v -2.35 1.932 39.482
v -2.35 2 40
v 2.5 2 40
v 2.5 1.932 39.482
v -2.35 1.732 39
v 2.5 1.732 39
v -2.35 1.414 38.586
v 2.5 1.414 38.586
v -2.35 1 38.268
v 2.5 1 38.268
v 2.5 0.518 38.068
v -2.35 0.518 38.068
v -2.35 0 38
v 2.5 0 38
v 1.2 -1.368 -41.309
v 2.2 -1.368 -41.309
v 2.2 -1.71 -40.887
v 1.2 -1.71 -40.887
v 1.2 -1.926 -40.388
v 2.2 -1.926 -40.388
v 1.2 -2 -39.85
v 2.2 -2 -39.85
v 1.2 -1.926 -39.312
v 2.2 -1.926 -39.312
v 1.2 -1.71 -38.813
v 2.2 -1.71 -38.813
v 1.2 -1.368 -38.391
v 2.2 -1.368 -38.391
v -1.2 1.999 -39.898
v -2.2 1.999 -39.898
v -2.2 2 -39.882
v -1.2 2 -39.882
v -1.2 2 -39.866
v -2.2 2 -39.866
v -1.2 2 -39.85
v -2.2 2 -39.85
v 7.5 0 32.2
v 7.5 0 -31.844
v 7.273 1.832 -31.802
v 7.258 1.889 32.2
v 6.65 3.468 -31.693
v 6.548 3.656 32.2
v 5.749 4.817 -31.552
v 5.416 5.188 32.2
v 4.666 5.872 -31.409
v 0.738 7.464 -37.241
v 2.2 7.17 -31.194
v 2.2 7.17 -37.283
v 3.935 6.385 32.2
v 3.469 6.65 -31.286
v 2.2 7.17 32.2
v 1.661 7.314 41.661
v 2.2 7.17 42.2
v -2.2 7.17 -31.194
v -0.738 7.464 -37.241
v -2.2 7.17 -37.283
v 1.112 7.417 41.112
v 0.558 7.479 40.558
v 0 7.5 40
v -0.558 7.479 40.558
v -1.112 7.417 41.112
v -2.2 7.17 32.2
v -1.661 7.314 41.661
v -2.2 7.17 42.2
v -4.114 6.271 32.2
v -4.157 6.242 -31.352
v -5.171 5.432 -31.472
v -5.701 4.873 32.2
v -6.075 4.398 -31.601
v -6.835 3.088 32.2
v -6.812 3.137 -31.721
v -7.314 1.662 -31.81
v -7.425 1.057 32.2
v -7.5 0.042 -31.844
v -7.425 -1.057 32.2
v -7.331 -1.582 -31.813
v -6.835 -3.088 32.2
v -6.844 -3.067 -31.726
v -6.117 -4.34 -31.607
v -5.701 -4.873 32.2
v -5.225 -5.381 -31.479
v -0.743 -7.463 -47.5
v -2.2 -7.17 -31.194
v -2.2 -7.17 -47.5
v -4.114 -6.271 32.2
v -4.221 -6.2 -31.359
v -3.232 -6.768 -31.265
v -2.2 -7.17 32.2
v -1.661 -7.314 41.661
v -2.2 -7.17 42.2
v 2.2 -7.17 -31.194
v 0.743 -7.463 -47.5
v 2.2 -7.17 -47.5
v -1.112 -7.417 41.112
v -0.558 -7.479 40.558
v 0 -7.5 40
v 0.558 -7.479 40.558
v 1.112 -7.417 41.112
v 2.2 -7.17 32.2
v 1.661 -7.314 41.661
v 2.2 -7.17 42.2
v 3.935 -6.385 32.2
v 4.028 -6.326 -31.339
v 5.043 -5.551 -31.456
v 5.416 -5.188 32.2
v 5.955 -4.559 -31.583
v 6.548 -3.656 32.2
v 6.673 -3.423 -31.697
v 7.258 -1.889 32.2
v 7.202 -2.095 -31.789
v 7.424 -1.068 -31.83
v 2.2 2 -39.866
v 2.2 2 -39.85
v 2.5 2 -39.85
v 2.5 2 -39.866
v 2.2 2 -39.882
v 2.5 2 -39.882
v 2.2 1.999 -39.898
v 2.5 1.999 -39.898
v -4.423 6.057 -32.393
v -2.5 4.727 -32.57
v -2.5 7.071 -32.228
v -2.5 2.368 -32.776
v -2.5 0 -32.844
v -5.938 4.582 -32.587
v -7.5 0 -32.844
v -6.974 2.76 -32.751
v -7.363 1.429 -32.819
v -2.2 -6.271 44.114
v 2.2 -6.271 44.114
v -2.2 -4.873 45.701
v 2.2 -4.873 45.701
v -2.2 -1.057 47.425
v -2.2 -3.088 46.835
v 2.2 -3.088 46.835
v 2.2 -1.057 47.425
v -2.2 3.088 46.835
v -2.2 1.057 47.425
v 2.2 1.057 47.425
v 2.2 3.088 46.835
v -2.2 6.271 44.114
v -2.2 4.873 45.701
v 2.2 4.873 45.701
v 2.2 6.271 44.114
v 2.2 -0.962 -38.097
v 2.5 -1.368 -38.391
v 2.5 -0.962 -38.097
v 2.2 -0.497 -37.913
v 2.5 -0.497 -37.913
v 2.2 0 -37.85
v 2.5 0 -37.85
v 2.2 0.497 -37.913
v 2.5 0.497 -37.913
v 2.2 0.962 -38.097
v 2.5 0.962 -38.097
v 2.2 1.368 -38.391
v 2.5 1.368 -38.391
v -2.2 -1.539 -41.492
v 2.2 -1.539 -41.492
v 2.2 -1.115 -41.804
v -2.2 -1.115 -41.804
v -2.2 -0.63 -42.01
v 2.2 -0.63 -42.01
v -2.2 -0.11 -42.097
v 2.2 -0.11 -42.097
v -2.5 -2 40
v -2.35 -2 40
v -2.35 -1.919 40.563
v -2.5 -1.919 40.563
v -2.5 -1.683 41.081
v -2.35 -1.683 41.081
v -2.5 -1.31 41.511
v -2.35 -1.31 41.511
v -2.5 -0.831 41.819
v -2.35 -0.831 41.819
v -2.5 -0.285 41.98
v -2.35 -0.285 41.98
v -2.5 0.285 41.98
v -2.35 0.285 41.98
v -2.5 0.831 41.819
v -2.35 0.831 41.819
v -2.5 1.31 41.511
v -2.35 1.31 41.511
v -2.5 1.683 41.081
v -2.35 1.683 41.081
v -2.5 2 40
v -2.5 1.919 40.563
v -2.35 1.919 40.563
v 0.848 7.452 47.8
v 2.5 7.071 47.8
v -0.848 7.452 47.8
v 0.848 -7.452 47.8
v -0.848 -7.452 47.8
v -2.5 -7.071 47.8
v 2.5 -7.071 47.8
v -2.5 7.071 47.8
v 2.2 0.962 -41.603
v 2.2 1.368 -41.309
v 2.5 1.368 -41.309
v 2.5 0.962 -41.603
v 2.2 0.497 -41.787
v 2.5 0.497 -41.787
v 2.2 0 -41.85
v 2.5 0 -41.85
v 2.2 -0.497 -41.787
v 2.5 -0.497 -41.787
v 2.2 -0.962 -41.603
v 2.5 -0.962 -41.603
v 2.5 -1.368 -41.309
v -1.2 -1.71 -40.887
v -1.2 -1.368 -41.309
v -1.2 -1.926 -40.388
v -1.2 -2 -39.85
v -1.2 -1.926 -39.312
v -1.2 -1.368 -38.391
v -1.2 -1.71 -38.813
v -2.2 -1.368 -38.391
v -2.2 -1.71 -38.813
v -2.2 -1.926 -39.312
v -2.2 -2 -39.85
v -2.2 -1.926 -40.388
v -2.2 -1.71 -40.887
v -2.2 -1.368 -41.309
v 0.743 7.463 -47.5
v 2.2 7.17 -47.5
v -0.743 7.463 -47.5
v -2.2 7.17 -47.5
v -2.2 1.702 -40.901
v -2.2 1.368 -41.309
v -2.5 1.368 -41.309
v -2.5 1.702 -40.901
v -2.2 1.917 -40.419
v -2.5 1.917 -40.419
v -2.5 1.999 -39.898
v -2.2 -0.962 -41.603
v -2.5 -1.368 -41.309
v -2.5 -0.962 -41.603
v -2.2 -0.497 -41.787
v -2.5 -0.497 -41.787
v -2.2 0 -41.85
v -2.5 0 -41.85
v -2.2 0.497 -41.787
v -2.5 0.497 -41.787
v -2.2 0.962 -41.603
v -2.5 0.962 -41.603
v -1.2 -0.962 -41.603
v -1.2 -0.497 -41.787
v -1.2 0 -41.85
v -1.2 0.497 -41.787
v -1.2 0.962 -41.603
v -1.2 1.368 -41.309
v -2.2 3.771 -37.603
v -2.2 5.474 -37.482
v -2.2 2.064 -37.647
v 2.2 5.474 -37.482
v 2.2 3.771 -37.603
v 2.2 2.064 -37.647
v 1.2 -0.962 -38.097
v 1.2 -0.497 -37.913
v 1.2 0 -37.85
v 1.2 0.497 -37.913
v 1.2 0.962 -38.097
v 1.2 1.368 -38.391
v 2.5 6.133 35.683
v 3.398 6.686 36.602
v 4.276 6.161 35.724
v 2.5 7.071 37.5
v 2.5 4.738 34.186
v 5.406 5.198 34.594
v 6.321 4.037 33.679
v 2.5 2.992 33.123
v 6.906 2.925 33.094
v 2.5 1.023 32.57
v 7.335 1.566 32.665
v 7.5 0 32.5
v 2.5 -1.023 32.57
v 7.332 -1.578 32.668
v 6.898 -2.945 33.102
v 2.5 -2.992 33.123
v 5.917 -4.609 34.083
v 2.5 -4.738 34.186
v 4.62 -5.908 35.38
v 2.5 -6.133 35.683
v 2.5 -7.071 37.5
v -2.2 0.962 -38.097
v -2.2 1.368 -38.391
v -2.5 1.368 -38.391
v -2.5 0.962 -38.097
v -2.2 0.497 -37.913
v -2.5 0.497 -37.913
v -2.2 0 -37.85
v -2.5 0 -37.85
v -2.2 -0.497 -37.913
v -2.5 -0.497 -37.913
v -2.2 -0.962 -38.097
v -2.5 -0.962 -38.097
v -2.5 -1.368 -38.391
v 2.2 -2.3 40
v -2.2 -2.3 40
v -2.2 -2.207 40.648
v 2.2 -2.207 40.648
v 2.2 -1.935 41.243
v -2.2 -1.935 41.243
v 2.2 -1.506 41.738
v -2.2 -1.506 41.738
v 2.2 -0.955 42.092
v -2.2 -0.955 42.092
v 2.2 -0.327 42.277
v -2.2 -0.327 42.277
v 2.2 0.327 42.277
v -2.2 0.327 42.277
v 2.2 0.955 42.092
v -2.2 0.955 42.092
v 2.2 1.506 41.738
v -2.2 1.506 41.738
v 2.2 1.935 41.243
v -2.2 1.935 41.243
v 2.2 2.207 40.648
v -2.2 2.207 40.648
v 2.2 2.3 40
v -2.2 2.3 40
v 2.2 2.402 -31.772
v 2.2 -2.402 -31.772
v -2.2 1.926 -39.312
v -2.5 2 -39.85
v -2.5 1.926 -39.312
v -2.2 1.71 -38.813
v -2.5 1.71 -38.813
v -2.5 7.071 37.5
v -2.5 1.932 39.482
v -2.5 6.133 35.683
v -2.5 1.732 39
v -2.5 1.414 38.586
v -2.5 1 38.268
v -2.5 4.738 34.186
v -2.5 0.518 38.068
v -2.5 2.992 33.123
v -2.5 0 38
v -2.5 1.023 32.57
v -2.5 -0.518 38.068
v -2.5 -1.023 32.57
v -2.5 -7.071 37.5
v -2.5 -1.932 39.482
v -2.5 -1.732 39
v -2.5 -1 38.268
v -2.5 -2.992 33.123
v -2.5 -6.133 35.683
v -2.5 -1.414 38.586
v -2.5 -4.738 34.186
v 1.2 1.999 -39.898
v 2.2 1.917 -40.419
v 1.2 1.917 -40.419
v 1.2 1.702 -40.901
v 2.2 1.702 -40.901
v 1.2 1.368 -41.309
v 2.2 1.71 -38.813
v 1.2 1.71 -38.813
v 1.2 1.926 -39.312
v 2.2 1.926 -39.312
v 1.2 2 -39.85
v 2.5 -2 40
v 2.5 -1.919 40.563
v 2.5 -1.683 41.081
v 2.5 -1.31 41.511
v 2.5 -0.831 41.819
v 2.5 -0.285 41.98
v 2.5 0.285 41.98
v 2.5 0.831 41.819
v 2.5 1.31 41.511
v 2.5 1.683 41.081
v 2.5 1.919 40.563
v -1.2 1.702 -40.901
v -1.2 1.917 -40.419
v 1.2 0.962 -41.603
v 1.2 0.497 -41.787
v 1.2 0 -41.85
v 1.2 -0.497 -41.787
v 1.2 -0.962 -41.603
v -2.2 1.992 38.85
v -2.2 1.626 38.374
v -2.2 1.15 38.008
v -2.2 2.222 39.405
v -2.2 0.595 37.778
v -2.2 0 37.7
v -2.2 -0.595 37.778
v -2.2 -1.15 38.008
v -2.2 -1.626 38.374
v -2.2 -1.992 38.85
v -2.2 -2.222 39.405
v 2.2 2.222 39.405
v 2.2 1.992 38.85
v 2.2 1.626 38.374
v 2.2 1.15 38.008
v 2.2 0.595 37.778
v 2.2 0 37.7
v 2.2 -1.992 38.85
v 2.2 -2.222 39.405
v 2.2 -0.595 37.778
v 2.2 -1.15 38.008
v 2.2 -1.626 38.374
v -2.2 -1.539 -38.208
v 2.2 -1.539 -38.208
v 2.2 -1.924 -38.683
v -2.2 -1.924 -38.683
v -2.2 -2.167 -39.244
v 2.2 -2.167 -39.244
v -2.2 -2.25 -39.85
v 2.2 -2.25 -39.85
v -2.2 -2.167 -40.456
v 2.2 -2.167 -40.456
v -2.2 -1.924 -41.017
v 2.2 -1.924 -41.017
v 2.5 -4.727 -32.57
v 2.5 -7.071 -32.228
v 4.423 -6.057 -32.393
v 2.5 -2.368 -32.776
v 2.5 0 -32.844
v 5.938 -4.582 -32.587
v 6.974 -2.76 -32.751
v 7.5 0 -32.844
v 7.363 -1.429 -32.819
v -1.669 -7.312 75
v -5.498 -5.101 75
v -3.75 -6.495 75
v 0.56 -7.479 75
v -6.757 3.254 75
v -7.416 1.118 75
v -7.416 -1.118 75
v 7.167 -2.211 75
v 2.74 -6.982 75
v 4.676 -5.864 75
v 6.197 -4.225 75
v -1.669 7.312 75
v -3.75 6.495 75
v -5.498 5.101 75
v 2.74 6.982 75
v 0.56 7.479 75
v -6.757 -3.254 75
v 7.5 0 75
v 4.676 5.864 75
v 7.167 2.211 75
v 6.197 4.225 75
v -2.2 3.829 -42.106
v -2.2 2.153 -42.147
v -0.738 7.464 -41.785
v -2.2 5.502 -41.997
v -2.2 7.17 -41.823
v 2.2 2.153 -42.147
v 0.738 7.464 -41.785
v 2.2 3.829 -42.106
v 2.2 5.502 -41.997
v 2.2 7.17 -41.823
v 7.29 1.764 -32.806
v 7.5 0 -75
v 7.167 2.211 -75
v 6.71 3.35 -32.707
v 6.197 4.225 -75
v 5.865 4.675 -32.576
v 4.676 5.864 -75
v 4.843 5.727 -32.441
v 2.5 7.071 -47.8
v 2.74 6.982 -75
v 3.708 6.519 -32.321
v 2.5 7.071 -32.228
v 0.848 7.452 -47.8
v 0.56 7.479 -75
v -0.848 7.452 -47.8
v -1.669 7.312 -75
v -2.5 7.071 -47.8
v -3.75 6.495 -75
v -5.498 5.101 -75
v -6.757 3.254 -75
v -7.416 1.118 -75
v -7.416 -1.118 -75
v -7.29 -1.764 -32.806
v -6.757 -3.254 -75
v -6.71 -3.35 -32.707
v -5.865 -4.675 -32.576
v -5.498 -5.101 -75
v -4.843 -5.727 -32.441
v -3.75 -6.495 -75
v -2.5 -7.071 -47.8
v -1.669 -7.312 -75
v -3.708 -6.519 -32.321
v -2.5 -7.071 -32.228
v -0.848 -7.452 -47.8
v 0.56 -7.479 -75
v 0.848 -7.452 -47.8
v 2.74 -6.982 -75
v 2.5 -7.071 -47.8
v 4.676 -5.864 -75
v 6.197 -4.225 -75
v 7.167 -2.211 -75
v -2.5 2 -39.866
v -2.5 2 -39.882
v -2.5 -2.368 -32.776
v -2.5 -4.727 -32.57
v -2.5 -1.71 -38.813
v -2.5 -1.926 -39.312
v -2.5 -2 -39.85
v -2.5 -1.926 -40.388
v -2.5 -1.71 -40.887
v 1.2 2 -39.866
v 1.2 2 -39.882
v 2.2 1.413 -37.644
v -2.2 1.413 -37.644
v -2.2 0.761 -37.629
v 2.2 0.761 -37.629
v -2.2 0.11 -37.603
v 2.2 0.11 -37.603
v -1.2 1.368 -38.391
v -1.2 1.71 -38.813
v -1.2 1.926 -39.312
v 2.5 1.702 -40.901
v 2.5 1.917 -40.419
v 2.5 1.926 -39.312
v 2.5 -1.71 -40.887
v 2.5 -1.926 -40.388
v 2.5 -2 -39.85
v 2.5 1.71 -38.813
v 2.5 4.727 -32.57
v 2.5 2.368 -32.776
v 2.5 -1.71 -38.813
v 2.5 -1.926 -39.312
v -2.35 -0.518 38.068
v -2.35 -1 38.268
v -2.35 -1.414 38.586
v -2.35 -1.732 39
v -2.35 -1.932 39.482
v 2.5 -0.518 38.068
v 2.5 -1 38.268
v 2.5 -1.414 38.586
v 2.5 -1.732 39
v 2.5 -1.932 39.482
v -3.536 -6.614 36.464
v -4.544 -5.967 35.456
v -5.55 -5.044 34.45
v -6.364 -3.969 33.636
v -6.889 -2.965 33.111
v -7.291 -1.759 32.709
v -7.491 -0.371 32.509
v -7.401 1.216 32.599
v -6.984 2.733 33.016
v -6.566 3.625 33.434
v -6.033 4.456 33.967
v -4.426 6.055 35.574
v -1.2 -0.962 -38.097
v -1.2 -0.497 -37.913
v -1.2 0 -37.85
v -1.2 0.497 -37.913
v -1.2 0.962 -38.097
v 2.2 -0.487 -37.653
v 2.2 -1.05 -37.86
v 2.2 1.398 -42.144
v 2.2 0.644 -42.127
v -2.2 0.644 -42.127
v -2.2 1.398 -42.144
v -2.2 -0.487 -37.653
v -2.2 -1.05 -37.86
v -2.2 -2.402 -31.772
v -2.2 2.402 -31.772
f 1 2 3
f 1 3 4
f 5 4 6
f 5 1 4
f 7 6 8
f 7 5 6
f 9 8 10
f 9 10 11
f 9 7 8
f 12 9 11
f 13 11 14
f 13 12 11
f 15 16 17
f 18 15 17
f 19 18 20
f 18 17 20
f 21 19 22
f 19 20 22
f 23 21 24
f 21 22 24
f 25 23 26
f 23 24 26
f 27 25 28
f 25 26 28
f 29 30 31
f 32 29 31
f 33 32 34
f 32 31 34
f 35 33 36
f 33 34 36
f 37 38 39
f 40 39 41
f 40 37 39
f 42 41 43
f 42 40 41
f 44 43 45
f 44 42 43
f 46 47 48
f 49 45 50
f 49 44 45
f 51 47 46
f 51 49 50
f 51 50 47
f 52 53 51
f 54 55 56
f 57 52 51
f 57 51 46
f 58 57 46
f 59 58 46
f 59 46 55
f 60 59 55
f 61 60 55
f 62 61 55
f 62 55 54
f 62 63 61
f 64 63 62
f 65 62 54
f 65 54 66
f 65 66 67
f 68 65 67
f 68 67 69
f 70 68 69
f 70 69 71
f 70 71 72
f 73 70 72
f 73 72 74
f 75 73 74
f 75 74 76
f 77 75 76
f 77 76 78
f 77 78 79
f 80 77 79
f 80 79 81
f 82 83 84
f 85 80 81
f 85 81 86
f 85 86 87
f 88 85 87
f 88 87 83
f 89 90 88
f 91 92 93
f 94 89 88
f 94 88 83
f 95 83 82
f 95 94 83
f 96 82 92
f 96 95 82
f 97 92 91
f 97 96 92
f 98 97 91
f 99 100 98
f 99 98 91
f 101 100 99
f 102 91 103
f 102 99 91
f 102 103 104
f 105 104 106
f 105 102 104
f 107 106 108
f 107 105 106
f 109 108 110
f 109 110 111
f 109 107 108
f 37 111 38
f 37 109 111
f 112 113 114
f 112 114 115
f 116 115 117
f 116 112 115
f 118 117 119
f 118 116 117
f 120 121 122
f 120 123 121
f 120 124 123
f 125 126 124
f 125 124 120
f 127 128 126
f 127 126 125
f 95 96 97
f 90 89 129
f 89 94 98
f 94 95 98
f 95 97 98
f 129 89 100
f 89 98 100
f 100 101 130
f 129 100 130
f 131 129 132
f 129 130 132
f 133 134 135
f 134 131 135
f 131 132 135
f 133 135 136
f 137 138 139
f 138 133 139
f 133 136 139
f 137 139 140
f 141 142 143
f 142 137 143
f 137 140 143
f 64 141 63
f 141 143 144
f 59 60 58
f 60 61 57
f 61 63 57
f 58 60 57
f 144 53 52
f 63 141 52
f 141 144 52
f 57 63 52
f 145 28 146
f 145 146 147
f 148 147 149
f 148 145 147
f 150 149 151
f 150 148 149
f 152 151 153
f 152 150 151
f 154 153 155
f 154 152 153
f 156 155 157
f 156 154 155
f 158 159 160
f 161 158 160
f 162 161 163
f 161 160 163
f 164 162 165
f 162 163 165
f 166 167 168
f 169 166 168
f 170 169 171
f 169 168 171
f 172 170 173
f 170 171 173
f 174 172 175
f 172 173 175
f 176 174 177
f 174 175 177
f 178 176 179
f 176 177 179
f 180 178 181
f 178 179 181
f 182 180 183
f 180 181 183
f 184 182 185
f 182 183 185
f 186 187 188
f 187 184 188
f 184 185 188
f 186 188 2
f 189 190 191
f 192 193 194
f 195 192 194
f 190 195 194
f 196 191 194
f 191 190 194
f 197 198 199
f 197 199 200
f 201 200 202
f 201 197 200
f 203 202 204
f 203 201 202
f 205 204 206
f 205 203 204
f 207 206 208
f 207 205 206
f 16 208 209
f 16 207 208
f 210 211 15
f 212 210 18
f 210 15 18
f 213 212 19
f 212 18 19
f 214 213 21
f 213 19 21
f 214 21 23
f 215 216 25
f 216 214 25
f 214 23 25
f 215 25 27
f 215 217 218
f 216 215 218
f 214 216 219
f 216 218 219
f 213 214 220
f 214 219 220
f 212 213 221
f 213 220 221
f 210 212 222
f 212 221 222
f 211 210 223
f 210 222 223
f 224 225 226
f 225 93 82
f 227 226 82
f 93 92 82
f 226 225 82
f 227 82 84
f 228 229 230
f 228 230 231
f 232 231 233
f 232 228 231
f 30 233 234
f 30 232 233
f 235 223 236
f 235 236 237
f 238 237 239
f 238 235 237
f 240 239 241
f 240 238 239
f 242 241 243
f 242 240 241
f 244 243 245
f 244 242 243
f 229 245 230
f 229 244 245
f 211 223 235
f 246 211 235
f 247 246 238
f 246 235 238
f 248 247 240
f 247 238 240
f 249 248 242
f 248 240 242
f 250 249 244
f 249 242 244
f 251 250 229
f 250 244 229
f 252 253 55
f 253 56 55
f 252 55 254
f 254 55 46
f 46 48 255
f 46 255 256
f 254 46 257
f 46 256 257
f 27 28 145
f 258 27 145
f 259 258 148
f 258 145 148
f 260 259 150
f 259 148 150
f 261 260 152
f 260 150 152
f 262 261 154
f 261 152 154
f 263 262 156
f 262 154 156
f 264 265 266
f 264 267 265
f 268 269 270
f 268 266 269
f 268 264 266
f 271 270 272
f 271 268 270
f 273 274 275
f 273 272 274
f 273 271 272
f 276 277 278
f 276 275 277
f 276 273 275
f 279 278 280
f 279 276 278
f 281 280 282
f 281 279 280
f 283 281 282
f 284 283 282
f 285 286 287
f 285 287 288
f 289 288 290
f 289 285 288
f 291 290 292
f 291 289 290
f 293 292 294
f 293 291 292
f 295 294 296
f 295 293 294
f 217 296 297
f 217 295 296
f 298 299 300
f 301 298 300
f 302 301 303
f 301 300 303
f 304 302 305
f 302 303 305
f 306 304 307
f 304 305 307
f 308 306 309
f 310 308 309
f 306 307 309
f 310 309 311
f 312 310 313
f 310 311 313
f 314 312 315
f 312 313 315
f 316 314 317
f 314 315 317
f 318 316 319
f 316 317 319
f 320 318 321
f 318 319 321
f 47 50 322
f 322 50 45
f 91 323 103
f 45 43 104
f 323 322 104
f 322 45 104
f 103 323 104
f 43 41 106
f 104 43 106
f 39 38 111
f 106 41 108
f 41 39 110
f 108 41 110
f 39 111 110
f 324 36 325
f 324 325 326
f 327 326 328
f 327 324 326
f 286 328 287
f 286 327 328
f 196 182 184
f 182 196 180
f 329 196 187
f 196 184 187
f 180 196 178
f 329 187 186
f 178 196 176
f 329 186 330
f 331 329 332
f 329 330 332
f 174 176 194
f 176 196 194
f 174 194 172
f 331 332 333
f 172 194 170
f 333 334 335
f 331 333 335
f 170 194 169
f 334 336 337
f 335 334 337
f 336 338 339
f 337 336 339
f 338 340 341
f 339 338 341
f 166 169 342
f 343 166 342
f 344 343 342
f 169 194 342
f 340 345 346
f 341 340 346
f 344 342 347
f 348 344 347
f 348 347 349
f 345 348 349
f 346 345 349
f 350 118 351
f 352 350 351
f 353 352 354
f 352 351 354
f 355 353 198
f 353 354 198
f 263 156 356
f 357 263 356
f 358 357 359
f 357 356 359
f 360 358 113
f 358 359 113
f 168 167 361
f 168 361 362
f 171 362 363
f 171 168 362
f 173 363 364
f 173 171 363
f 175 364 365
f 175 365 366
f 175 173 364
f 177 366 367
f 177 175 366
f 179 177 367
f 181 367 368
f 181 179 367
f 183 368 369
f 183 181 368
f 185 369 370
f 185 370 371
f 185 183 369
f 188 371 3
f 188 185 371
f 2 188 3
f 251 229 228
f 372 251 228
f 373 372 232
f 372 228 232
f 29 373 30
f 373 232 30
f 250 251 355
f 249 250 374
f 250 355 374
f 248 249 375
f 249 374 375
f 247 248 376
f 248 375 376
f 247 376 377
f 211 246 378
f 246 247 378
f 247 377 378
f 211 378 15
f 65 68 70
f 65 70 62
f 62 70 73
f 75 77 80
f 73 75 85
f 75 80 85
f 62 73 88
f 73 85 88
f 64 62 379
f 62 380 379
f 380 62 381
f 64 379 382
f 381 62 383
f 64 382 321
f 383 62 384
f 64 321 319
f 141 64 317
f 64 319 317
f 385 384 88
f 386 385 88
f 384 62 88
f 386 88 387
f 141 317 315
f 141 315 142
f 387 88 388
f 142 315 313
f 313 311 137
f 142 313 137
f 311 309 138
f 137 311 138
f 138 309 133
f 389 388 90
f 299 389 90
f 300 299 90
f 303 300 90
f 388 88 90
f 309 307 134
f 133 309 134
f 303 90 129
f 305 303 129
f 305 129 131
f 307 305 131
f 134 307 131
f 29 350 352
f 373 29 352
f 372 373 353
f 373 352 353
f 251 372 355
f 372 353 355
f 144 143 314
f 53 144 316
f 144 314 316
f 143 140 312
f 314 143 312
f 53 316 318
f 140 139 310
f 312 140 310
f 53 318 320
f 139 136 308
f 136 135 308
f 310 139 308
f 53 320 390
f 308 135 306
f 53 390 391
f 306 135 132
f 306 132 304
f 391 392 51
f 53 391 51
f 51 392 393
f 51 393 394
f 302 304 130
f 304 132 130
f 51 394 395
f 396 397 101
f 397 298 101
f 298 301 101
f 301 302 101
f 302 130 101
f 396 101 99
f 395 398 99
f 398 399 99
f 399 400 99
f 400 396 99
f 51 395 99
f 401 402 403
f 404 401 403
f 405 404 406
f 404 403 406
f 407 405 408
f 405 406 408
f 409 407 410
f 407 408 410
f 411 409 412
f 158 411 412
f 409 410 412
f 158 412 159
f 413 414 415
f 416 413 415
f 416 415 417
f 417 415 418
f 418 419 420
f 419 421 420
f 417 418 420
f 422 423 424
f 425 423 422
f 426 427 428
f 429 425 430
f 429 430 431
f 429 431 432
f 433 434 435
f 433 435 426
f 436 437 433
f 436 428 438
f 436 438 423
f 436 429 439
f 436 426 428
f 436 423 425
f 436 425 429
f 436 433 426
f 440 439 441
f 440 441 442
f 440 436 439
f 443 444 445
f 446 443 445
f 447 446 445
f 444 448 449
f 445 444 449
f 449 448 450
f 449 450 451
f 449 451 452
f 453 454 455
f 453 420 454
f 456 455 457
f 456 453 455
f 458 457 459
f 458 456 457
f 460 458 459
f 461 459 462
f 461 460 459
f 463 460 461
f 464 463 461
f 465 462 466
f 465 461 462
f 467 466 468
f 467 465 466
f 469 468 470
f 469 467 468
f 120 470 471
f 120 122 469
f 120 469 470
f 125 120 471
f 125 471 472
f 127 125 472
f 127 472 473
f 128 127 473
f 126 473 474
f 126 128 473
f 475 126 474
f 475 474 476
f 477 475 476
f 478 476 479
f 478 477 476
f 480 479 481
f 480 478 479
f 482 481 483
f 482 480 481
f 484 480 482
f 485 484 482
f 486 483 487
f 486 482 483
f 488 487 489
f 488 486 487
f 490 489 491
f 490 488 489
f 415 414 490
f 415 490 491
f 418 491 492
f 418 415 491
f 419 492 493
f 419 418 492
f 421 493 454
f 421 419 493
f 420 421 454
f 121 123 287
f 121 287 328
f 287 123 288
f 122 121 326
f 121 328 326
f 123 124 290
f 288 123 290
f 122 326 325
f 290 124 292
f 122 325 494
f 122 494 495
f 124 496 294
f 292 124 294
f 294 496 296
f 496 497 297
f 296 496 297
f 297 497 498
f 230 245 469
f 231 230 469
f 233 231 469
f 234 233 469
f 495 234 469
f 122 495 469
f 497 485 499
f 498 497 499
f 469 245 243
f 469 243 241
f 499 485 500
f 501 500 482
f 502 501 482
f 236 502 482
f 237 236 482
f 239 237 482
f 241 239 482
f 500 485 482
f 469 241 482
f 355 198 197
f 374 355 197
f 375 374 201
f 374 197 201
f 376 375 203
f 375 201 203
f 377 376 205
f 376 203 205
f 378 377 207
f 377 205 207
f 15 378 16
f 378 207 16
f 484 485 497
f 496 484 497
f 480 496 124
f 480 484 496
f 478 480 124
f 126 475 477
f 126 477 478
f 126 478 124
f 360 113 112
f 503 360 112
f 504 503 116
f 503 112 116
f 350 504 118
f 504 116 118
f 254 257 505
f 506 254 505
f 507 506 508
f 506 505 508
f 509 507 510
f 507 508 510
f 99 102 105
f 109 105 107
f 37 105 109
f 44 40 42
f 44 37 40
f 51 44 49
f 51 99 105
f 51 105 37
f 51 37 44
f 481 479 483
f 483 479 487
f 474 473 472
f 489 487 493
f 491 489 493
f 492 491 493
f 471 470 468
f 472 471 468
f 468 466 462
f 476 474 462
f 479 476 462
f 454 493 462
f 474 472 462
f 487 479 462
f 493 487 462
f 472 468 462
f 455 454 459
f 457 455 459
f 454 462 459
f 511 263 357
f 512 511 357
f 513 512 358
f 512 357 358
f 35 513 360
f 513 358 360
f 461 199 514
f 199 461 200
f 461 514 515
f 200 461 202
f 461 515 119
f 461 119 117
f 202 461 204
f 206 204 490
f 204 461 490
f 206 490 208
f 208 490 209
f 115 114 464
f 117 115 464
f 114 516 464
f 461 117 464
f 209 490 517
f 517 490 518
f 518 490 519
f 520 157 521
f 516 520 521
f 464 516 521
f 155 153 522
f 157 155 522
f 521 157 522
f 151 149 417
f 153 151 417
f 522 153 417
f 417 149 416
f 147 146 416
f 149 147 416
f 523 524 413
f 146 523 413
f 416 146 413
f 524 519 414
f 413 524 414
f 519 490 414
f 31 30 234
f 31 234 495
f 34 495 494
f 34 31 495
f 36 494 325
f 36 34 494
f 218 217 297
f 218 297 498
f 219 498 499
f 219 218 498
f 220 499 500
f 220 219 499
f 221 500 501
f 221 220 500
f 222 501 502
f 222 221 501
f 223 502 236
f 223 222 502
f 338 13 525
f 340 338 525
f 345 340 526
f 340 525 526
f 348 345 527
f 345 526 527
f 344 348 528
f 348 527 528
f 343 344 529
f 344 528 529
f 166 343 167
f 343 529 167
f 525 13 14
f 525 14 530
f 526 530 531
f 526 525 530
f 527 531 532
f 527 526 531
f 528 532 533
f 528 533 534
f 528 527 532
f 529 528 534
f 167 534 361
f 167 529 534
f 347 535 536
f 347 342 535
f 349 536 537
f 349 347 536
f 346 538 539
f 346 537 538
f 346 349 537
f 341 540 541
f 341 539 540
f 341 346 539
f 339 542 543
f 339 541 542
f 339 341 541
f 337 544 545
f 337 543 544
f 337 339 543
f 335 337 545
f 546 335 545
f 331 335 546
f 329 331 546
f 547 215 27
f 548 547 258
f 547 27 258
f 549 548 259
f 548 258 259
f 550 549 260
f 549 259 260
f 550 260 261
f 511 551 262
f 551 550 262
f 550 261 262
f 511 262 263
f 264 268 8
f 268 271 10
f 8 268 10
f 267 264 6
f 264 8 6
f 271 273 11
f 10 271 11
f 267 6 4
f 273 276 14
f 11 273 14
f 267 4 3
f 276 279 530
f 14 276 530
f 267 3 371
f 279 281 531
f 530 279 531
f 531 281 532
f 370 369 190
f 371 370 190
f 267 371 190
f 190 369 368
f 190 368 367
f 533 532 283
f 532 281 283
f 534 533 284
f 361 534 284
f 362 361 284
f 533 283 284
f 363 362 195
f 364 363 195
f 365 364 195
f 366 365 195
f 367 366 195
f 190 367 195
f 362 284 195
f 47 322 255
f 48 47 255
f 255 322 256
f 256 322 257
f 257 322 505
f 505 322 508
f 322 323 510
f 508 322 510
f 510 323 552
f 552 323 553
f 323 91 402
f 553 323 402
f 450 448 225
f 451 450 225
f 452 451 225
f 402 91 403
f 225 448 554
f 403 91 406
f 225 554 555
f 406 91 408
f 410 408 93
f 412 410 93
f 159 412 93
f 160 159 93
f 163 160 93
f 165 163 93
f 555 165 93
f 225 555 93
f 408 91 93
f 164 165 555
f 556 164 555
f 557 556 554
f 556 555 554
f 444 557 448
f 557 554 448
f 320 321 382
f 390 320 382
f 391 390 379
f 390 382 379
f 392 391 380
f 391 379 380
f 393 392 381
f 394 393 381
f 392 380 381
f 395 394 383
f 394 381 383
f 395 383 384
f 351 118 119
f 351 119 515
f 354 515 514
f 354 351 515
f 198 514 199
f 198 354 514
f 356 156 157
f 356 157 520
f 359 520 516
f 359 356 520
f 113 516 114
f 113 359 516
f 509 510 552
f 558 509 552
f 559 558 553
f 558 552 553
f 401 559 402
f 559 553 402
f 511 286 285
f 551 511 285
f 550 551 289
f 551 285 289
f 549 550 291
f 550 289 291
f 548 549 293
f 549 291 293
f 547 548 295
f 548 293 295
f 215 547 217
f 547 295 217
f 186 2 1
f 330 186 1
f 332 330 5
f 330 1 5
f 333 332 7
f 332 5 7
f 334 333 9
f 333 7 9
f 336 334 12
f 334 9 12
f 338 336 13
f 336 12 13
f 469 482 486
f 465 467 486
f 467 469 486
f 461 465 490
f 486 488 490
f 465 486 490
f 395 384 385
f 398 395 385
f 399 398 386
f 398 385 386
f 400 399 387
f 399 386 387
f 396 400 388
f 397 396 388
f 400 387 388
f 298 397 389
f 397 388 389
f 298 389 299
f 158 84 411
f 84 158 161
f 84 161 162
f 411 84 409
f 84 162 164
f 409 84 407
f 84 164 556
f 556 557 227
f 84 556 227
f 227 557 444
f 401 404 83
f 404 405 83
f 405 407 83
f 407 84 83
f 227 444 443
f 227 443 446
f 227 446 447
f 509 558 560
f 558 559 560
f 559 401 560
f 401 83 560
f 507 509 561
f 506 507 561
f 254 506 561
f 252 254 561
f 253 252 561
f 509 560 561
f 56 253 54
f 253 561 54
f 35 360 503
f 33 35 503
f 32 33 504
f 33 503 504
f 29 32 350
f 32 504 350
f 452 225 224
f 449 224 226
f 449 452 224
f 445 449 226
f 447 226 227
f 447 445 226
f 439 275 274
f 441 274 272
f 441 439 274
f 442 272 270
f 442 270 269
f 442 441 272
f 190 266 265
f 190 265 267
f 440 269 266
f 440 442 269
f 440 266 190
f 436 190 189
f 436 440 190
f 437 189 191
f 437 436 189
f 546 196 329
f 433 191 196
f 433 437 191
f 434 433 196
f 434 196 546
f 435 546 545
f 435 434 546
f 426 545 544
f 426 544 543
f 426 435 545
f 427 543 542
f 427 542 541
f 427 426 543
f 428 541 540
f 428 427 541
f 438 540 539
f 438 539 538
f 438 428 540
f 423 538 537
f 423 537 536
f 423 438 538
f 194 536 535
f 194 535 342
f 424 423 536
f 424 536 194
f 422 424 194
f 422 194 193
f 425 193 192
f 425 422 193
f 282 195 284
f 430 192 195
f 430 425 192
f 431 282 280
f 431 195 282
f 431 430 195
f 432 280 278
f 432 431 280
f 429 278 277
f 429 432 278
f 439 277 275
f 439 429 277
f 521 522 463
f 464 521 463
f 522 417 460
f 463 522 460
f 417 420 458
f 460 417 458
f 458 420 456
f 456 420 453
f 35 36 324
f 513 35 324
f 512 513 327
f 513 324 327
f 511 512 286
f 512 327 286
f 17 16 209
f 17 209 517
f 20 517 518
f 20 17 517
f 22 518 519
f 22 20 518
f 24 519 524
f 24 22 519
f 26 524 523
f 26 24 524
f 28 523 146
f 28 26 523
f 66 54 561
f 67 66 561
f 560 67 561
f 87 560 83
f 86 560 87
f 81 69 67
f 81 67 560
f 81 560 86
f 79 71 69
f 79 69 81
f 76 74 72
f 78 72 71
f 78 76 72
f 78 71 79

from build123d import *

# Parameters (mm, degrees)
F0_R           = 7.5
F1_DEPTH       = 75
F3_DEPTH       = 12.5
F8_DEPTH       = 4.8
F9_DEPTH       = 25
F10_DEPTH      = 4.6
F11_DEPTH      = 25
F12_DEPTH      = 4.7
F13_DEPTH      = 3
F13_DEPTH_BACK = 6
F14_DEPTH      = 12.5
F16_DEPTH      = 4.6
F20_DEPTH      = 7.8
F23_DEPTH      = 13.8
F24_DEPTH      = 1


with BuildPart() as f1:
    # F0 (on Top) → F1 (new body, symmetric)
    with BuildSketch(Plane.XY):
        Circle(F0_R)
    extrude(amount=F1_DEPTH, both=True)

    # F2 (on Front) → F3 (cut, symmetric)
    with BuildSketch(Plane.XZ):
        Polygon((2.2, 32.5), (2.2, 32.2), (2.5, 32.2), (2.5, 40), (2.5, 47.8), (0, 47.8), (-2.5, 47.8), (-2.5, 42.1871210635), (-2.5, 32.2), (-2.2, 32.2), (-2.2, 32.5), (-2.2, 40), (-2.2, 47.5), (0, 47.5), (2.2, 47.5), (2.2, 40), align=None)
    extrude(amount=F3_DEPTH, both=True, mode=Mode.SUBTRACT)

    # F7 (on offset) → F8 (cut)
    with BuildSketch(Plane(origin=(-2.35, 0, 0), x_dir=(0, -1, 0), z_dir=(-1, 0, 0))):
        with BuildLine():
            Line((-2, 40), (0, 40))
            Line((0, 40), (2, 40))
            ThreePointArc((2, 40), (0, 42), (-2, 40))
        make_face()
        with BuildLine():
            Line((0, 40), (0, 38))
            ThreePointArc((0, 38), (1.4142135624, 38.5857864376), (2, 40))
            Line((2, 40), (0, 40))
        make_face()
        with BuildLine():
            Line((0, 38), (0, 37.7))
            ThreePointArc((0, 37.7), (1.6263455967, 38.3736544033), (2.3, 40))
            Line((2.3, 40), (2, 40))
            ThreePointArc((2, 40), (1.4142135624, 38.5857864376), (0, 38))
        make_face()
        with BuildLine():
            ThreePointArc((-2, 40), (-1.4142135624, 38.5857864376), (0, 38))
            Line((0, 38), (0, 40))
            Line((0, 40), (-2, 40))
        make_face()
        with BuildLine():
            ThreePointArc((-2.3, 40), (-1.6263455967, 38.3736544033), (0, 37.7))
            Line((0, 37.7), (0, 38))
            ThreePointArc((0, 38), (-1.4142135624, 38.5857864376), (-2, 40))
            Line((-2, 40), (-2.3, 40))
        make_face()
        with BuildLine():
            ThreePointArc((2.3, 40), (0, 42.3), (-2.3, 40))
            Line((-2.3, 40), (-2, 40))
            ThreePointArc((-2, 40), (0, 42), (2, 40))
            Line((2, 40), (2.3, 40))
        make_face()
    extrude(amount=-F8_DEPTH, mode=Mode.SUBTRACT)

    # F5 (on offset) → F9 (cut)
    with BuildSketch(Plane.YZ.offset(2.35)):
        with BuildLine():
            Line((-7.8, 32.2), (0, 32.2))
            ThreePointArc((0, 32.2), (-5.5154328933, 34.4845671067), (-7.8, 40))
            Line((-7.8, 40), (-7.8, 32.2))
        make_face()
        with BuildLine():
            ThreePointArc((-7.8, 40), (-5.5154328933, 34.4845671067), (0, 32.2))
            Line((0, 32.2), (0, 32.5))
            ThreePointArc((0, 32.5), (-5.3033008589, 34.6966991411), (-7.5, 40))
            Line((-7.5, 40), (-7.8, 40))
        make_face()
        with BuildLine():
            Line((0, 32.5), (0, 32.2))
            ThreePointArc((0, 32.2), (5.5154328933, 34.4845671067), (7.8, 40))
            Line((7.8, 40), (7.5, 40))
            ThreePointArc((7.5, 40), (5.3033008589, 34.6966991411), (0, 32.5))
        make_face()
        with BuildLine():
            ThreePointArc((7.8, 40), (5.5154328933, 34.4845671067), (0, 32.2))
            Line((0, 32.2), (7.8, 32.2))
            Line((7.8, 32.2), (7.8, 40))
        make_face()
    extrude(amount=F9_DEPTH, mode=Mode.SUBTRACT)

    # F5 (on offset) → F10 (cut)
    with BuildSketch(Plane.YZ.offset(2.35)):
        with BuildLine():
            ThreePointArc((0, 47.8), (5.5154328933, 45.5154328933), (7.8, 40))
            Line((7.8, 40), (7.8, 47.8))
            Line((7.8, 47.8), (0, 47.8))
        make_face()
        with BuildLine():
            ThreePointArc((0, 47.8), (-5.5154328933, 45.5154328933), (-7.8, 40))
            Line((-7.8, 40), (-7.5, 40))
            ThreePointArc((-7.5, 40), (0, 47.5), (7.5, 40))
            Line((7.5, 40), (7.8, 40))
            ThreePointArc((7.8, 40), (5.5154328933, 45.5154328933), (0, 47.8))
        make_face()
        with BuildLine():
            Line((-7.8, 47.8), (-7.8, 40))
            ThreePointArc((-7.8, 40), (-5.5154328933, 45.5154328933), (0, 47.8))
            Line((0, 47.8), (-7.8, 47.8))
        make_face()
    extrude(amount=-F10_DEPTH, mode=Mode.SUBTRACT)

    # F7 (on offset) → F11 (cut)
    with BuildSketch(Plane(origin=(-2.35, 0, 0), x_dir=(0, -1, 0), z_dir=(-1, 0, 0))):
        with BuildLine():
            ThreePointArc((7.8, 40), (5.5154328933, 34.4845671067), (0, 32.2))
            Line((0, 32.2), (7.8, 32.2))
            Line((7.8, 32.2), (7.8, 40))
        make_face()
        with BuildLine():
            Line((0, 32.5), (0, 32.2))
            ThreePointArc((0, 32.2), (5.5154328933, 34.4845671067), (7.8, 40))
            Line((7.8, 40), (7.5, 40))
            ThreePointArc((7.5, 40), (5.3033008589, 34.6966991411), (0, 32.5))
        make_face()
        with BuildLine():
            ThreePointArc((-7.8, 40), (-5.5154328933, 34.4845671067), (0, 32.2))
            Line((0, 32.2), (0, 32.5))
            ThreePointArc((0, 32.5), (-5.3033008589, 34.6966991411), (-7.5, 40))
            Line((-7.5, 40), (-7.8, 40))
        make_face()
        with BuildLine():
            Line((-7.8, 32.2), (0, 32.2))
            ThreePointArc((0, 32.2), (-5.5154328933, 34.4845671067), (-7.8, 40))
            Line((-7.8, 40), (-7.8, 32.2))
        make_face()
    extrude(amount=F11_DEPTH, mode=Mode.SUBTRACT)

    # F7 (on offset) → F12 (cut)
    with BuildSketch(Plane(origin=(-2.35, 0, 0), x_dir=(0, -1, 0), z_dir=(-1, 0, 0))):
        with BuildLine():
            Line((-2, 40), (0, 40))
            Line((0, 40), (2, 40))
            ThreePointArc((2, 40), (0, 42), (-2, 40))
        make_face()
        with BuildLine():
            ThreePointArc((-2, 40), (-1.4142135624, 38.5857864376), (0, 38))
            Line((0, 38), (0, 40))
            Line((0, 40), (-2, 40))
        make_face()
        with BuildLine():
            Line((0, 38), (0, 37.7))
            ThreePointArc((0, 37.7), (1.6263455967, 38.3736544033), (2.3, 40))
            Line((2.3, 40), (2, 40))
            ThreePointArc((2, 40), (1.4142135624, 38.5857864376), (0, 38))
        make_face()
        with BuildLine():
            Line((0, 40), (0, 38))
            ThreePointArc((0, 38), (1.4142135624, 38.5857864376), (2, 40))
            Line((2, 40), (0, 40))
        make_face()
        with BuildLine():
            ThreePointArc((2.3, 40), (0, 42.3), (-2.3, 40))
            Line((-2.3, 40), (-2, 40))
            ThreePointArc((-2, 40), (0, 42), (2, 40))
            Line((2, 40), (2.3, 40))
        make_face()
        with BuildLine():
            ThreePointArc((-2.3, 40), (-1.6263455967, 38.3736544033), (0, 37.7))
            Line((0, 37.7), (0, 38))
            ThreePointArc((0, 38), (-1.4142135624, 38.5857864376), (-2, 40))
            Line((-2, 40), (-2.3, 40))
        make_face()
    extrude(amount=-F12_DEPTH, mode=Mode.SUBTRACT)

    # F7 (on offset) → F13 (join, two sides)
    with BuildSketch(Plane(origin=(-2.35, 0, 0), x_dir=(0, -1, 0), z_dir=(-1, 0, 0))) as f13_sk:
        with BuildLine():
            Line((-2, 40), (0, 40))
            Line((0, 40), (2, 40))
            ThreePointArc((2, 40), (0, 42), (-2, 40))
        make_face()
        with BuildLine():
            ThreePointArc((-2, 40), (-1.4142135624, 38.5857864376), (0, 38))
            Line((0, 38), (0, 40))
            Line((0, 40), (-2, 40))
        make_face()
        with BuildLine():
            Line((0, 40), (0, 38))
            ThreePointArc((0, 38), (1.4142135624, 38.5857864376), (2, 40))
            Line((2, 40), (0, 40))
        make_face()
    extrude(amount=F13_DEPTH)
    extrude(f13_sk.sketch, amount=-F13_DEPTH_BACK)

    # F2 (on Front) → F14 (cut, symmetric)
    with BuildSketch(Plane.XZ):
        Polygon((2.5, -32.2), (2.2, -32.2), (2.2, -32.5), (2.2, -40), (2.2, -47.5), (0, -47.5), (-2.2, -47.5), (-2.2, -40), (-2.2, -32.5), (-2.2, -32.2), (-2.5, -32.2), (-2.5, -42.1871210635), (-2.5, -47.8), (0, -47.8), (2.5, -47.8), (2.5, -40), align=None)
    extrude(amount=F14_DEPTH, both=True, mode=Mode.SUBTRACT)

    # F15 (on face) → F16 (cut)
    with BuildSketch(Plane.YZ.offset(2.2)):
        with BuildLine():
            ThreePointArc((0.1100212297, -37.6026915367), (-0.7758600895, -37.7380006815), (-1.5386621402, -38.2083487525))
            Line((-1.5386621402, -38.2083487525), (-1.3676996802, -38.3907544467))
            ThreePointArc((-1.3676996802, -38.3907544467), (0, -37.85), (1.3676996802, -38.3907544467))
            Line((1.3676996802, -38.3907544467), (2.0643335182, -37.6474919855))
            ThreePointArc((2.0643335182, -37.6474919855), (1.0868861776, -37.6377945056), (0.1100212297, -37.6026915367))
        make_face()
        with BuildLine():
            Line((-1.3676996802, -38.3907544467), (-1.5386621402, -38.2083487525))
            ThreePointArc((-1.5386621402, -38.2083487525), (-2.25, -39.85), (-1.5386621402, -41.4916512475))
            Line((-1.5386621402, -41.4916512475), (-1.3676996802, -41.3092455533))
            ThreePointArc((-1.3676996802, -41.3092455533), (-2, -39.85), (-1.3676996802, -38.3907544467))
        make_face()
        with BuildLine():
            Line((-1.3676996802, -41.3092455533), (-1.5386621402, -41.4916512475))
            ThreePointArc((-1.5386621402, -41.4916512475), (-0.8782052034, -41.9215346052), (-0.1100212297, -42.0973084633))
            ThreePointArc((-0.1100212297, -42.0973084633), (1.0211843118, -42.1374539432), (2.1530602611, -42.1471736102))
            Line((2.1530602611, -42.1471736102), (1.3676996802, -41.3092455533))
            ThreePointArc((1.3676996802, -41.3092455533), (0, -41.85), (-1.3676996802, -41.3092455533))
        make_face()
        with BuildLine():
            Line((2.0643335182, -37.6474919855), (1.3676996802, -38.3907544467))
            ThreePointArc((1.3676996802, -38.3907544467), (1.8351293361, -39.0548268617), (2, -39.85))
            ThreePointArc((2, -39.85), (1.9998581405, -39.8738205311), (1.9994325823, -39.8976376831))
            ThreePointArc((1.9994325823, -39.8976376831), (1.8255284476, -40.6669736146), (1.3676996802, -41.3092455533))
            Line((1.3676996802, -41.3092455533), (2.1530602611, -42.1471736102))
            ThreePointArc((2.1530602611, -42.1471736102), (8.3064049344, -41.6648335588), (14.3230944724, -40.2879713302))
            ThreePointArc((14.3230944724, -40.2879713302), (15.8123595839, -37.4760165959), (13.0004048496, -35.9867514844))
            ThreePointArc((13.0004048496, -35.9867514844), (7.5937742961, -37.2214779165), (2.0643335182, -37.6474919855))
        make_face()
    extrude(amount=-F16_DEPTH, mode=Mode.SUBTRACT)

    # F19 (on offset) → F20 (cut)
    with BuildSketch(Plane.YZ.offset(10)):
        with BuildLine():
            ThreePointArc((10.2028084727, -30.516141973), (-0.1003538011, -31.8442659218), (-10.3966962167, -30.4642663105))
            Line((-10.3966962167, -30.4642663105), (-10.3966962167, -31.4992174021))
            ThreePointArc((-10.3966962167, -31.4992174021), (-5.2416788265, -32.5067027946), (0, -32.8443922819))
            ThreePointArc((0, -32.8443922819), (5.142310672, -32.5194356619), (10.2028084727, -31.5497357802))
            Line((10.2028084727, -31.5497357802), (10.2028084727, -30.516141973))
        make_face()
    extrude(amount=-F20_DEPTH, mode=Mode.SUBTRACT)

    # F22 (on offset) → F23 (cut)
    with BuildSketch(Plane.YZ.offset(-16)):
        with BuildLine():
            ThreePointArc((10.2028084727, -30.516141973), (-0.1003538011, -31.8442659218), (-10.3966962167, -30.4642663105))
            Line((-10.3966962167, -30.4642663105), (-10.3966962167, -31.4992174021))
            ThreePointArc((-10.3966962167, -31.4992174021), (-5.2416788265, -32.5067027946), (0, -32.8443922819))
            ThreePointArc((0, -32.8443922819), (5.142310672, -32.5194356619), (10.2028084727, -31.5497357802))
            Line((10.2028084727, -31.5497357802), (10.2028084727, -30.516141973))
        make_face()
    extrude(amount=F23_DEPTH, mode=Mode.SUBTRACT)

    # F24 (add, symmetric): faces of the model
    f24_faces = [f1.faces().sort_by_distance(p)[0] for p in [
        (2.2, 0, -39.85),
        (-2.2, 0, -39.85),
    ]]
    extrude(f24_faces, amount=F24_DEPTH, both=True, dir=(1, 0, 0))


solid = f1.part
